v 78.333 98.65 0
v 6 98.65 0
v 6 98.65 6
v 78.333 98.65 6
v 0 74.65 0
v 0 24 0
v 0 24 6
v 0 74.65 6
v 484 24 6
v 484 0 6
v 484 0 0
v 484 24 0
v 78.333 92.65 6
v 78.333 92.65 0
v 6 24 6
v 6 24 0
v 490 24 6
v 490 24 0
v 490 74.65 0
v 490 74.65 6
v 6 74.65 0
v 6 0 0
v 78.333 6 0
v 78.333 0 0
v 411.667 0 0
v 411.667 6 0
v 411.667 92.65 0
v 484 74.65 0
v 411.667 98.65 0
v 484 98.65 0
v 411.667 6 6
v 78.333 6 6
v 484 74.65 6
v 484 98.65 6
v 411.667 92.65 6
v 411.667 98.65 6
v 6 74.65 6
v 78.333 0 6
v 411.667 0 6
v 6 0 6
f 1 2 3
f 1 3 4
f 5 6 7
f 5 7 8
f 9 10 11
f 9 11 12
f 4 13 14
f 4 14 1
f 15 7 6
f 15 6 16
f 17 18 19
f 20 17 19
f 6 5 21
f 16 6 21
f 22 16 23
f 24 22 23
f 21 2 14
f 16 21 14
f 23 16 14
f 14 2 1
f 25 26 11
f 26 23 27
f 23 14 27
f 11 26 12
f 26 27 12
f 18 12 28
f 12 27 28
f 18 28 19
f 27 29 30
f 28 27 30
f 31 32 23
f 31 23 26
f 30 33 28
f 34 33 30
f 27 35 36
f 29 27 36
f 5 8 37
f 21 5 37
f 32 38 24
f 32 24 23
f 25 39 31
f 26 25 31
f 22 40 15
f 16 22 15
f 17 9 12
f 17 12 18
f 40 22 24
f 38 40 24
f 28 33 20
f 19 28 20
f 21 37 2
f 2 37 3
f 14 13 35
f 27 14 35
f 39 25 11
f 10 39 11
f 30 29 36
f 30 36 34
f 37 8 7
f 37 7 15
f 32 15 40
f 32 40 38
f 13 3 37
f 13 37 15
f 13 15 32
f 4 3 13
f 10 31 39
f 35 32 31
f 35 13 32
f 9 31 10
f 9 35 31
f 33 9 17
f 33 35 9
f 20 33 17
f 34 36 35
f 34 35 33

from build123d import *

# Parameters (mm, degrees)
SKETCH1_W           = 490
SKETCH1_H           = 98.65
BOSS_EXTRUDE1_DEPTH = 6
SKETCH2_W           = 6
SKETCH2_H           = 24
SKETCH2_W_2         = 333.333333334
SKETCH2_H_2         = 6
CUT_EXTRUDE1_DEPTH  = 500.867805024


with BuildPart() as part:
    # Sketch1 → Boss-Extrude1 (new body)
    with BuildSketch(Plane.XY):
        with Locations((245, 49.325)):
            Rectangle(SKETCH1_W, SKETCH1_H)
    extrude(amount=BOSS_EXTRUDE1_DEPTH)

    # Sketch2 → Cut-Extrude1 (cut, through all)
    with BuildSketch(Plane.XY.offset(6)):
        with Locations((487, 86.65)):
            Rectangle(SKETCH2_W, SKETCH2_H)
        with Locations((487, 12)):
            Rectangle(SKETCH2_W, SKETCH2_H)
        with Locations((3, 12)):
            Rectangle(SKETCH2_W, SKETCH2_H)
        with Locations((3, 86.65)):
            Rectangle(SKETCH2_W, SKETCH2_H)
        with Locations((245, 95.65)):
            Rectangle(SKETCH2_W_2, SKETCH2_H_2)
        with Locations((245, 3)):
            Rectangle(SKETCH2_W_2, SKETCH2_H_2)
    extrude(amount=-CUT_EXTRUDE1_DEPTH, mode=Mode.SUBTRACT)


solid = part.part
